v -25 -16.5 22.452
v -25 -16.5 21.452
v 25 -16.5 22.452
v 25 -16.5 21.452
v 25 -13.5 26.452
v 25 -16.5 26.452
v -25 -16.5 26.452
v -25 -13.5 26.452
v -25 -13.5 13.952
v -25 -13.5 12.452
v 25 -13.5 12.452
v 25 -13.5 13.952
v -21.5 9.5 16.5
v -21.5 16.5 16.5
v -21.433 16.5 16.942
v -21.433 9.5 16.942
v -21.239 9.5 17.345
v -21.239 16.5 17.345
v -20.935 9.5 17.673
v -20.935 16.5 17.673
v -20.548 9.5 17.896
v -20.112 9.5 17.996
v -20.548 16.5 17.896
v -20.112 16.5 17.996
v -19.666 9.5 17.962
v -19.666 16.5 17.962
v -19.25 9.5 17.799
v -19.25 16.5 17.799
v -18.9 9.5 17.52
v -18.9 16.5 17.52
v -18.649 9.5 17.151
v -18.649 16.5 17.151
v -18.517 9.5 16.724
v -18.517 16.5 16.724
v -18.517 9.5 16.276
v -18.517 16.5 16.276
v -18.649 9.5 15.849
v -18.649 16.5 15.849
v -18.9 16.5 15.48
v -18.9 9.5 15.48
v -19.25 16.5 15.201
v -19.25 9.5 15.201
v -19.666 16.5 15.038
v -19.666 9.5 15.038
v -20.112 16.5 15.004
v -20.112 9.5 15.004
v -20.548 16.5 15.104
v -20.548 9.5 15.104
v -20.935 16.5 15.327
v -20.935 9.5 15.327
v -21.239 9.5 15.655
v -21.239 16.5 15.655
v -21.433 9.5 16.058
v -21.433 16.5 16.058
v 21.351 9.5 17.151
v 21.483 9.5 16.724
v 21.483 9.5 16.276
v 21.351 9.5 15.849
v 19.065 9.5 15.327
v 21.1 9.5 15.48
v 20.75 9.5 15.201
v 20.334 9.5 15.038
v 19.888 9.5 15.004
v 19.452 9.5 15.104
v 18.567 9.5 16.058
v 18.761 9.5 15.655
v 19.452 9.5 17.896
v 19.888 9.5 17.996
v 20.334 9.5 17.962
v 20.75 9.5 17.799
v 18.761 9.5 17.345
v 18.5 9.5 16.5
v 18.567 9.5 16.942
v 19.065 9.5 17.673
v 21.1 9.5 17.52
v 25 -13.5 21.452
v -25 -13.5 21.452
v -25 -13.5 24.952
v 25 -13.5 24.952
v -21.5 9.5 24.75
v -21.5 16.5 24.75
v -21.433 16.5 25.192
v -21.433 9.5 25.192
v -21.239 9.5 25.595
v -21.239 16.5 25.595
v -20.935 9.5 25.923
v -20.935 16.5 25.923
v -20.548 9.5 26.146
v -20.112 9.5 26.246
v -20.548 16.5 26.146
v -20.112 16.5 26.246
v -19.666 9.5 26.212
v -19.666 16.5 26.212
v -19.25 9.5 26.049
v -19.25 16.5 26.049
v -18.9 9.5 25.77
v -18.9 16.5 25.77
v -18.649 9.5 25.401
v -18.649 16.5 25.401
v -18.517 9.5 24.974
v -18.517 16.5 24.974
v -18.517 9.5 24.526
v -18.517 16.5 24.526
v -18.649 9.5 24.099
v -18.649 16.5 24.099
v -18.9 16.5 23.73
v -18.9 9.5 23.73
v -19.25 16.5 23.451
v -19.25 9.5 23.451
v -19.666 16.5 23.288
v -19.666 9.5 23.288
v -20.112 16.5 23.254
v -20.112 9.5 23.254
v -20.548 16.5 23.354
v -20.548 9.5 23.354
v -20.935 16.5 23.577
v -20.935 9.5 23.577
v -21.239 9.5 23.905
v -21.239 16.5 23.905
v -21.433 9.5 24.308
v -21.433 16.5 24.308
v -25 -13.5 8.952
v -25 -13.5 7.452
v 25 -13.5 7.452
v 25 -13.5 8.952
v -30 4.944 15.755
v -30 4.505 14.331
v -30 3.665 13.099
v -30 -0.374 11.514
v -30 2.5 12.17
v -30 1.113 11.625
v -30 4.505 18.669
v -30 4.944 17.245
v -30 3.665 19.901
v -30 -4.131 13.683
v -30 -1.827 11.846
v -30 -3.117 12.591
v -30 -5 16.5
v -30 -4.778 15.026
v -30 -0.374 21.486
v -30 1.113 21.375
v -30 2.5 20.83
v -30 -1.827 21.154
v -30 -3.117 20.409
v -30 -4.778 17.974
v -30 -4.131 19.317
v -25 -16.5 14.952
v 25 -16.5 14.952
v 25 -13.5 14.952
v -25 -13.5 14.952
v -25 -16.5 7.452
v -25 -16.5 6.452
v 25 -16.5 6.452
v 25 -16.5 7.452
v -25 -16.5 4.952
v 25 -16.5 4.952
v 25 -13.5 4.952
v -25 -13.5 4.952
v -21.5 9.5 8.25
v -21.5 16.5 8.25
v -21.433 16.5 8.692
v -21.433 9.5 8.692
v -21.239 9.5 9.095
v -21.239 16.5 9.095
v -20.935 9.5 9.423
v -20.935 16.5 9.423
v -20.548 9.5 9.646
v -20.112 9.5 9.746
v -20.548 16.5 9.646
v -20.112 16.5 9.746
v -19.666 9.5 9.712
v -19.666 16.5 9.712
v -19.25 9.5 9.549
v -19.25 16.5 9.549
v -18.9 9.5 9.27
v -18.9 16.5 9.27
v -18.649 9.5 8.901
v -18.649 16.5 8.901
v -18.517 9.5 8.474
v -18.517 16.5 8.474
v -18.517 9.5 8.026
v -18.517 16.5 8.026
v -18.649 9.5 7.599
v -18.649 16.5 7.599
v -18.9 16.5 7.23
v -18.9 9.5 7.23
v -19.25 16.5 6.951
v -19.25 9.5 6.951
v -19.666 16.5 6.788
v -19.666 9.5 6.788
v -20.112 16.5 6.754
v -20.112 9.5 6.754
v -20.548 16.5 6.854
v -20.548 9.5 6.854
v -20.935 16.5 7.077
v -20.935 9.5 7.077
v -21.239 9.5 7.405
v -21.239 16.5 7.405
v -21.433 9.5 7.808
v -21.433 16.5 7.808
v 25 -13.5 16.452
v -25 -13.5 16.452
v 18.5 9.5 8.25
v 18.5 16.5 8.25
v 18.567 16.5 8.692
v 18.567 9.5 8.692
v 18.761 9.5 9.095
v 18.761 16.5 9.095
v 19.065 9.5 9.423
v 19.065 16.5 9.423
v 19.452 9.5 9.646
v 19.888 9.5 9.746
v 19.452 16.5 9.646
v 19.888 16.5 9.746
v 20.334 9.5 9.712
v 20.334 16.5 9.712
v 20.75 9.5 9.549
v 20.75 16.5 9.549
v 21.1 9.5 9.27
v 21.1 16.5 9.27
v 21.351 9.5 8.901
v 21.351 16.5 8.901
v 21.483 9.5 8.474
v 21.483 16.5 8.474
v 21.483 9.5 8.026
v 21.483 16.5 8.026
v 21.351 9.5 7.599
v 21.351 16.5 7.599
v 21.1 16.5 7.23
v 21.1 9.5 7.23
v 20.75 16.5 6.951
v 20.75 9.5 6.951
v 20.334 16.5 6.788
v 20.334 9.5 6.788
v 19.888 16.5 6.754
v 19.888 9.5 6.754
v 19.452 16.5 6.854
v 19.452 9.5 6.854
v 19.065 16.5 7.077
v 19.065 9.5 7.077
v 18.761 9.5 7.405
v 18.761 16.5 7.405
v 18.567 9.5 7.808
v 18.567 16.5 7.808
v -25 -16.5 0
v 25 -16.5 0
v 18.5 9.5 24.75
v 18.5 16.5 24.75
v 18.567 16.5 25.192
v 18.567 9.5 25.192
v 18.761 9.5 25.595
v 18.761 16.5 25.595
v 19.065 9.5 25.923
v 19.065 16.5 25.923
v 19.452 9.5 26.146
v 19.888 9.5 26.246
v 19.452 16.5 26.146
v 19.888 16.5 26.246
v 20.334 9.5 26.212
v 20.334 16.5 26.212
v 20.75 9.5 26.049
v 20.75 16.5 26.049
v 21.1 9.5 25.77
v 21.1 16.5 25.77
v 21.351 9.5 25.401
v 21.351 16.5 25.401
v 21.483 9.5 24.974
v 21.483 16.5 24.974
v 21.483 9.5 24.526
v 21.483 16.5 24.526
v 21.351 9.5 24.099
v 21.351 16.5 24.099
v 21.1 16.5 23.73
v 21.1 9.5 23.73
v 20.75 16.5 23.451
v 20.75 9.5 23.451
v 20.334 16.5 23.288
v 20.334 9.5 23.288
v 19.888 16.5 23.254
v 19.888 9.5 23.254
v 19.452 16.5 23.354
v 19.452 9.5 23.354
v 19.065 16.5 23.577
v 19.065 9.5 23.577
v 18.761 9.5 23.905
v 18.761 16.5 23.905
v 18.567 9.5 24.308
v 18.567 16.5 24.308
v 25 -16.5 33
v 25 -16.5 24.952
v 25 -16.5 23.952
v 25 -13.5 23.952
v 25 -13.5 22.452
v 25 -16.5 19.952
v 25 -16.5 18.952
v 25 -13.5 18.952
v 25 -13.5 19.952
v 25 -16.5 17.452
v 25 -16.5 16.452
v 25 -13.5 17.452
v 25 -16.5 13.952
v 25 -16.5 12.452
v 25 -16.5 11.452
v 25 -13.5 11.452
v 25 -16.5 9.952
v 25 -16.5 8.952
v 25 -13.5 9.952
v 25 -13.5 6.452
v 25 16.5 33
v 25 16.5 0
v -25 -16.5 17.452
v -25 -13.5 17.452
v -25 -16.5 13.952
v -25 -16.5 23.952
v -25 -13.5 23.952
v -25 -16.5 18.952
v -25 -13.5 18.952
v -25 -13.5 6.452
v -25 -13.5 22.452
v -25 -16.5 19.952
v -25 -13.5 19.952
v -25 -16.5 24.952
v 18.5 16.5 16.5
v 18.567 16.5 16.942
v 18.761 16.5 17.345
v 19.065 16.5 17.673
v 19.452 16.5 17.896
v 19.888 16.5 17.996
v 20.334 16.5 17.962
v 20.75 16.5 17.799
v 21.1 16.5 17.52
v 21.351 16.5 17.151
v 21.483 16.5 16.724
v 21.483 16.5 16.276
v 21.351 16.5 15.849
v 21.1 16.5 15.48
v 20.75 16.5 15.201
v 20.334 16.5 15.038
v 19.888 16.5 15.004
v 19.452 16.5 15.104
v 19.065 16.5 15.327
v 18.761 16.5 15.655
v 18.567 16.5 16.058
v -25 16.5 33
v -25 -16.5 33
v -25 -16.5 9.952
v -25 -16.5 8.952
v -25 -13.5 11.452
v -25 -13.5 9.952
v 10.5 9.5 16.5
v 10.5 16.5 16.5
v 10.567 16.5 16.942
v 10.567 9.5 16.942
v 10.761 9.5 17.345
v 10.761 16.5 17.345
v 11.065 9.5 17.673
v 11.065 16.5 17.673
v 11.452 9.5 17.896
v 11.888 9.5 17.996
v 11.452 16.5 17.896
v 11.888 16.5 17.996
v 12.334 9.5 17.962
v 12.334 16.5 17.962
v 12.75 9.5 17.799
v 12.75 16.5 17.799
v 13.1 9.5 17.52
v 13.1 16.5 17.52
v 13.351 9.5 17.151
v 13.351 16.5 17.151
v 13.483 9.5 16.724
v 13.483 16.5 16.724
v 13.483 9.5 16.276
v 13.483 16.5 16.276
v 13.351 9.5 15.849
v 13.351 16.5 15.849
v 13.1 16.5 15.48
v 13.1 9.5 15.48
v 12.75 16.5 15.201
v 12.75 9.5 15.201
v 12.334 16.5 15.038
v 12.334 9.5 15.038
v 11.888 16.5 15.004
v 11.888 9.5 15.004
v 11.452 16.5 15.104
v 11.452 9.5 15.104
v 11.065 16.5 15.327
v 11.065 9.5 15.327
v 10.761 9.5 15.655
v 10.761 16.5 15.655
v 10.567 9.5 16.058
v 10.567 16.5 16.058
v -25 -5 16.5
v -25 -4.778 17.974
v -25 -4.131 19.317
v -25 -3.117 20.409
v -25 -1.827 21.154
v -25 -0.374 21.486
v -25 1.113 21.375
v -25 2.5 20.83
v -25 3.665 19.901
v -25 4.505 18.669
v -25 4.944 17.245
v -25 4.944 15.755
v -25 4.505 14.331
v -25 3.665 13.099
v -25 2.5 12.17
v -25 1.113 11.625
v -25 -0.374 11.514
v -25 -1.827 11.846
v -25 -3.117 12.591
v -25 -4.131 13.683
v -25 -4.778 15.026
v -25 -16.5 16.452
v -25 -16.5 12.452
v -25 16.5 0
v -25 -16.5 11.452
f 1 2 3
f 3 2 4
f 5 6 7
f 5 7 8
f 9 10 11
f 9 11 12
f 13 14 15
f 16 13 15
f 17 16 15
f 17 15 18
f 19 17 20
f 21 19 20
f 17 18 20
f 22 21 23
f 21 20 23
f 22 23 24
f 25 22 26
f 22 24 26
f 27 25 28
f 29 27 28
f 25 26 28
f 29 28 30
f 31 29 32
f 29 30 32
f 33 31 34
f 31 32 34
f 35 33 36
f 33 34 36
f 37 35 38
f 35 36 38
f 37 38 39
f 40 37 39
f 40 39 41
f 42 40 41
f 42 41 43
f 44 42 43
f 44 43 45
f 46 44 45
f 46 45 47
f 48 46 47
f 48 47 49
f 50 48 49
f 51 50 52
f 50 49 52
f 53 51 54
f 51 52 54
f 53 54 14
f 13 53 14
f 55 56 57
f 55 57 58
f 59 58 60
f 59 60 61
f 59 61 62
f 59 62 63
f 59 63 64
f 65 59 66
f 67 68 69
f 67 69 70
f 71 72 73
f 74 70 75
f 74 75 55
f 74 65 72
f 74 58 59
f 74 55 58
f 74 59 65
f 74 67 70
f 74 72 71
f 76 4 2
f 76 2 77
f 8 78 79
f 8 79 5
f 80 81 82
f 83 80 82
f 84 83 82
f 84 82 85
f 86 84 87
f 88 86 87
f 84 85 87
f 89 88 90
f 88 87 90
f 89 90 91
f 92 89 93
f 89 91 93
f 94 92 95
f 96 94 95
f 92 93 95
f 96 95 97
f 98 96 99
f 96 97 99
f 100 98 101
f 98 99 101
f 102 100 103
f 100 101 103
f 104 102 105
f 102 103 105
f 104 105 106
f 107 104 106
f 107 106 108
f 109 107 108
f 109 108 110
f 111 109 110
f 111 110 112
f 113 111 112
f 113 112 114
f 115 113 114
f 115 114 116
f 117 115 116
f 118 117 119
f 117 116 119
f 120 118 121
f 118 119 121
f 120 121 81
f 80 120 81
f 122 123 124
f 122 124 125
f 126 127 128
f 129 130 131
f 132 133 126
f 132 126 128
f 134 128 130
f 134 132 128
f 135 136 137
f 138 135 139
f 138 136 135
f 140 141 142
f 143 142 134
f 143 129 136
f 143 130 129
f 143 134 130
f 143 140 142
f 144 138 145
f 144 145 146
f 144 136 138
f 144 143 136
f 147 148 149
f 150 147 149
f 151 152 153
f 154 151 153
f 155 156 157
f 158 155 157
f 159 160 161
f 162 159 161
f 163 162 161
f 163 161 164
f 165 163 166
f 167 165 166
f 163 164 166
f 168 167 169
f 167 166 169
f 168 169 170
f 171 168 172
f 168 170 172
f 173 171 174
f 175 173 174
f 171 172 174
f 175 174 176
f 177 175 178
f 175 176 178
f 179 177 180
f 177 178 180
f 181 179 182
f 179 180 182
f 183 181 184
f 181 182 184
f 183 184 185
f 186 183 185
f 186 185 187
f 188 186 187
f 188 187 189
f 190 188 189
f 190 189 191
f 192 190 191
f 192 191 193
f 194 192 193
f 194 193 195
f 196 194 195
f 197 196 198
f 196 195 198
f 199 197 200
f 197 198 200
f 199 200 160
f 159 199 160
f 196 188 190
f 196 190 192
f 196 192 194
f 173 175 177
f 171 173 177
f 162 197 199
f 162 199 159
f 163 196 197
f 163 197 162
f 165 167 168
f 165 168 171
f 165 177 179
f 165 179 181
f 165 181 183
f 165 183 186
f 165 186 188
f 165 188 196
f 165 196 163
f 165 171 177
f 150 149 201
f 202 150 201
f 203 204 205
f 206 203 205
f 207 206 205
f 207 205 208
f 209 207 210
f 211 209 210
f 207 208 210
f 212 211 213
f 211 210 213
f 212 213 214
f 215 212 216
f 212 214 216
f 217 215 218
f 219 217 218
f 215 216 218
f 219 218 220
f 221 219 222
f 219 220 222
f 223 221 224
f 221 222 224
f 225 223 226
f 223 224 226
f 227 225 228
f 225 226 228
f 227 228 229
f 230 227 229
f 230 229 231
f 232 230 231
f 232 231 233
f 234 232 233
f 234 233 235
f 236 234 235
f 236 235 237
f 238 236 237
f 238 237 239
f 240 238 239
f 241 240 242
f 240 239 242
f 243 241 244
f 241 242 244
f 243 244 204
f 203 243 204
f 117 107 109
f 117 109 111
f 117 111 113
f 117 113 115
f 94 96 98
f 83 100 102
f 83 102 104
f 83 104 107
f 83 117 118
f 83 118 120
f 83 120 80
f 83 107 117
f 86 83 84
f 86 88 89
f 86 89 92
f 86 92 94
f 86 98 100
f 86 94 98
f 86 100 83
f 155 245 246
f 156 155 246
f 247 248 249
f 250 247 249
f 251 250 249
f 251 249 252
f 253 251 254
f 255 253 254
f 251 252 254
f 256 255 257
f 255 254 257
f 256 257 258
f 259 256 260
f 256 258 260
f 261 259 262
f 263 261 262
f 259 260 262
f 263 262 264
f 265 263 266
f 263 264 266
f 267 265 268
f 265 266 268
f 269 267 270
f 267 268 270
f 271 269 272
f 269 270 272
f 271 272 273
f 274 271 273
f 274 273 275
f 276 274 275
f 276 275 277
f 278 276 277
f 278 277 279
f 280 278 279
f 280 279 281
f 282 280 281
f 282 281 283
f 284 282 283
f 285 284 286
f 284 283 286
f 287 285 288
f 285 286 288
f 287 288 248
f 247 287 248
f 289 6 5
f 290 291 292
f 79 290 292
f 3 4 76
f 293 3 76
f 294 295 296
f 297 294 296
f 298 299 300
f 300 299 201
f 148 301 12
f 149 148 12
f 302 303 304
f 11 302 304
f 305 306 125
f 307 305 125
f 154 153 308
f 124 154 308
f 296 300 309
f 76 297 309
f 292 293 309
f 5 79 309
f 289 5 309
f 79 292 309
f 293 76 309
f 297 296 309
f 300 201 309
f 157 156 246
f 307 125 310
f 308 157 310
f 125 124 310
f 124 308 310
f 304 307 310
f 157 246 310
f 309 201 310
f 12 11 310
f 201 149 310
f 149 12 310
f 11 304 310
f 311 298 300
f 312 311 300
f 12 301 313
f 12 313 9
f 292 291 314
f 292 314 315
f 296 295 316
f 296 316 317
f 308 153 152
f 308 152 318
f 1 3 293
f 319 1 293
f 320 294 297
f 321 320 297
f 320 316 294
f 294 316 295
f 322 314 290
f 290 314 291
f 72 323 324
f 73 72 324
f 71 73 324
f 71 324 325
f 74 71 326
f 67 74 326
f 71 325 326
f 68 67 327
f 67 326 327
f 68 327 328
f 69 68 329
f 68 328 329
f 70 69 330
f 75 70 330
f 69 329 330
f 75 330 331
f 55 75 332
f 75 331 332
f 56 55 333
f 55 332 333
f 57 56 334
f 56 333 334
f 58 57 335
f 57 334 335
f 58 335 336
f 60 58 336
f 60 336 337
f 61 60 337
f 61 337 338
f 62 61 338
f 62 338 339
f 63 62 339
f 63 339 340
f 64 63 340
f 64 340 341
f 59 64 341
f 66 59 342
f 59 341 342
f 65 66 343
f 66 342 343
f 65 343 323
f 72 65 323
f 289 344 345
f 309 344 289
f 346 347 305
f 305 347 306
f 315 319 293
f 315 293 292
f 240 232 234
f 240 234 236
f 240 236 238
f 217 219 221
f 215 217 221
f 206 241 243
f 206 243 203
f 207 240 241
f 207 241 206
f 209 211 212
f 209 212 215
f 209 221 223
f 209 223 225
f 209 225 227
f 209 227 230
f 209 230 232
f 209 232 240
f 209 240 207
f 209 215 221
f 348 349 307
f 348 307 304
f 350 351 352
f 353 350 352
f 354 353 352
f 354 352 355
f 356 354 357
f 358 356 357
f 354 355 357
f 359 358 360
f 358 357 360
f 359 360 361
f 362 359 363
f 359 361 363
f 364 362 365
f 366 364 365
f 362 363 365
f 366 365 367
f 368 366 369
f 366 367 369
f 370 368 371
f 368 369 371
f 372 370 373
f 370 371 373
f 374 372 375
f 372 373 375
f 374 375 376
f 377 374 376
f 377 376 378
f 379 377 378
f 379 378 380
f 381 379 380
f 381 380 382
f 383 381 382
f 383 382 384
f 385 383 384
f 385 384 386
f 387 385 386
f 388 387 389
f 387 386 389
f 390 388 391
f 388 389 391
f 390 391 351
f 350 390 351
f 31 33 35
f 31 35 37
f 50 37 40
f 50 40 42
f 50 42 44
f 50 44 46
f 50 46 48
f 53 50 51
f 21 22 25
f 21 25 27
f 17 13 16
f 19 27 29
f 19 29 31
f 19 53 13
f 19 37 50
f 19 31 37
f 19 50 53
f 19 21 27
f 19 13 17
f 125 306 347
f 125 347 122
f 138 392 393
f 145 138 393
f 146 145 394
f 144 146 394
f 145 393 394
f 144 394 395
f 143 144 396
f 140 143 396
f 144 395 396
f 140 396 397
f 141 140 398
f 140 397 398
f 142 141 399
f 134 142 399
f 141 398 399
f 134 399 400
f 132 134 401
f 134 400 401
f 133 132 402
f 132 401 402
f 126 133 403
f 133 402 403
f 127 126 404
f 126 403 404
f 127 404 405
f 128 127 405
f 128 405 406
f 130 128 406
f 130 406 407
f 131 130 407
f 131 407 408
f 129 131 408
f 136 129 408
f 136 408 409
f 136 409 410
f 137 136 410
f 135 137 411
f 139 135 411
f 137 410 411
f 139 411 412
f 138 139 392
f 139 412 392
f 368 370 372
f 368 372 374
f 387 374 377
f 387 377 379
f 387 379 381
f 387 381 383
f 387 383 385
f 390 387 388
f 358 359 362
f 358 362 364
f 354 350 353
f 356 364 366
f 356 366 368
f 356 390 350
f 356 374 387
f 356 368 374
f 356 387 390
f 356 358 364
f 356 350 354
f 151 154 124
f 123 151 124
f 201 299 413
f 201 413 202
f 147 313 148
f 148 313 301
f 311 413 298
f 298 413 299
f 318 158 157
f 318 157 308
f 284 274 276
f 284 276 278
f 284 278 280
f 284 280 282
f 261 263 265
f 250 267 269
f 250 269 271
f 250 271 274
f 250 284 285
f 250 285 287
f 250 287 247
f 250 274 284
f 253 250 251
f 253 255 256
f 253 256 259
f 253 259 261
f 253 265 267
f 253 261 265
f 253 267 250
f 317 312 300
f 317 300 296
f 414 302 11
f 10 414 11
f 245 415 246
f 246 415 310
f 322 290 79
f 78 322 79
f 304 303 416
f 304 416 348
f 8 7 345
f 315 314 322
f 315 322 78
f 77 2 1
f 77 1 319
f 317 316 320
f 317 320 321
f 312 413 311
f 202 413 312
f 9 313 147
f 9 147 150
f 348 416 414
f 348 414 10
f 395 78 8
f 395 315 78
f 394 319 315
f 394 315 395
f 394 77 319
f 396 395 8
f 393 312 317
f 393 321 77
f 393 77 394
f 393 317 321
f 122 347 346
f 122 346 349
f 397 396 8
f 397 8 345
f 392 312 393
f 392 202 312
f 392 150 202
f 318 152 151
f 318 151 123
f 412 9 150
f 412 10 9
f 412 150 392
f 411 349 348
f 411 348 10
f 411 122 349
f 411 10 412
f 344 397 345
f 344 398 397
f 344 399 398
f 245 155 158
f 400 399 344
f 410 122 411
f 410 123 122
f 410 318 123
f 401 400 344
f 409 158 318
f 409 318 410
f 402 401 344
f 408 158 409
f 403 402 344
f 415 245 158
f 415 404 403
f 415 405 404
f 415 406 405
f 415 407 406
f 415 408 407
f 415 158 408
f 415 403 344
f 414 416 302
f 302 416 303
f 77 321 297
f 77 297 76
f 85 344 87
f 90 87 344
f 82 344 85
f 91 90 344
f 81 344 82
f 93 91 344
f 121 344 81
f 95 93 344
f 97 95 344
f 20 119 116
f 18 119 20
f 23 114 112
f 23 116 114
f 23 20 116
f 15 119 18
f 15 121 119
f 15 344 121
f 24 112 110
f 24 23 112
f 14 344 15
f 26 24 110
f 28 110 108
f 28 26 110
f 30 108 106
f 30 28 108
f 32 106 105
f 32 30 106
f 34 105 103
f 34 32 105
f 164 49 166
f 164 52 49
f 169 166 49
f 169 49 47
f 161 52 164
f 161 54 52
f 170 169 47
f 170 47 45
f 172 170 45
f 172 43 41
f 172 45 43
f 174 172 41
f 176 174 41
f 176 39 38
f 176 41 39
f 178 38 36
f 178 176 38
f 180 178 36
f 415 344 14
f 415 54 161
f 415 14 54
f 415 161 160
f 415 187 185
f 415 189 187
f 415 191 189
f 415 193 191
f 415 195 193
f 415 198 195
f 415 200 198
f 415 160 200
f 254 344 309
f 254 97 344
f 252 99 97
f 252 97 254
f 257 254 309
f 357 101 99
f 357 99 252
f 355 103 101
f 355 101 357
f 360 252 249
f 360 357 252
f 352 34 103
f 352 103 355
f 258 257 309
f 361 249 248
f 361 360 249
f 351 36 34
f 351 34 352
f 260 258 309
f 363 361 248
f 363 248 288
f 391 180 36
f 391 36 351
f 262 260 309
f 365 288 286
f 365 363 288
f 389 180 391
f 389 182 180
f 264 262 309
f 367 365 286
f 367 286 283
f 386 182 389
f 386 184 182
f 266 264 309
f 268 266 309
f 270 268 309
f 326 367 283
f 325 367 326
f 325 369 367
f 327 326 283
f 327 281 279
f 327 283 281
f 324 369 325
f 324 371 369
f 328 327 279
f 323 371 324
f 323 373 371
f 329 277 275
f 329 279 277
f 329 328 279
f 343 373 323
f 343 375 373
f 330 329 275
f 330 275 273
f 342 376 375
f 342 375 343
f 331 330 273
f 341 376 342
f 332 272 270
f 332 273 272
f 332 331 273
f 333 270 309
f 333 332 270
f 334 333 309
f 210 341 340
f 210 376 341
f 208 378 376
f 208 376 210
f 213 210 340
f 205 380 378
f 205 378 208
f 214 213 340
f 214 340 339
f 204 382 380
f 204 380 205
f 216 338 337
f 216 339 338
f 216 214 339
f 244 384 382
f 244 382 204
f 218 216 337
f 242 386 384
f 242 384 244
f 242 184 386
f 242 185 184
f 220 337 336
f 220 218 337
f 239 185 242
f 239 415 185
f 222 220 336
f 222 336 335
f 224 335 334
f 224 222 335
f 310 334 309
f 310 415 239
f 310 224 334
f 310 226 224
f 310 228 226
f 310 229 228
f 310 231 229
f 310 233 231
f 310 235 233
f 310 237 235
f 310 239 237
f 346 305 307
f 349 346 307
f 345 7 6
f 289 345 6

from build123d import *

# Parameters (mm, degrees)
F0_W     = 50
F0_H     = 33
F1_DEPTH = 33
F2_W     = 6
F2_H     = 1.5
F3_DEPTH = 50.001
F4_R     = 5
F5_DEPTH = 5
F6_R     = 1.5
F7_DEPTH = 7


with BuildPart() as f1:
    # F0 (on Top) → F1 (new body)
    with BuildSketch(Plane.XY):
        Rectangle(F0_W, F0_H)
    extrude(amount=F1_DEPTH)

    # F2 (on face) → F3 (cut, through all)
    with BuildSketch(Plane.YZ.offset(25)):
        with Locations((-16.5, 25.702117)):
            Rectangle(F2_W, F2_H)
        with Locations((-16.5, 23.202117)):
            Rectangle(F2_W, F2_H)
        with Locations((-16.5, 20.702117)):
            Rectangle(F2_W, F2_H)
        with Locations((-16.5, 18.202117)):
            Rectangle(F2_W, F2_H)
        with Locations((-16.5, 15.702117)):
            Rectangle(F2_W, F2_H)
        with Locations((-16.5, 13.202117)):
            Rectangle(F2_W, F2_H)
        with Locations((-16.5, 10.702117)):
            Rectangle(F2_W, F2_H)
        with Locations((-16.5, 8.202117)):
            Rectangle(F2_W, F2_H)
        with Locations((-16.5, 5.702117)):
            Rectangle(F2_W, F2_H)
    extrude(amount=-F3_DEPTH, mode=Mode.SUBTRACT)

    # F4 (on face) → F5 (join)
    with BuildSketch(Plane(origin=(-25, 0, 0), x_dir=(0, -1, 0), z_dir=(-1, 0, 0))):
        with Locations((0, 16.5)):
            Circle(F4_R)
    extrude(amount=F5_DEPTH)

    # F6 (on face) → F7 (cut)
    with BuildSketch(Plane(origin=(0, 16.5, 0), x_dir=(-1, 0, 0), z_dir=(0, 1, 0))):
        with Locations((-20, 8.25)):
            Circle(F6_R)
        with Locations((-20, 16.5)):
            Circle(F6_R)
        with Locations((-20, 24.75)):
            Circle(F6_R)
        with Locations((-12, 16.5)):
            Circle(F6_R)
        with Locations((20, 16.5)):
            Circle(F6_R)
        with Locations((20, 8.25)):
            Circle(F6_R)
        with Locations((20, 24.75)):
            Circle(F6_R)
    extrude(amount=-F7_DEPTH, mode=Mode.SUBTRACT)


solid = f1.part
